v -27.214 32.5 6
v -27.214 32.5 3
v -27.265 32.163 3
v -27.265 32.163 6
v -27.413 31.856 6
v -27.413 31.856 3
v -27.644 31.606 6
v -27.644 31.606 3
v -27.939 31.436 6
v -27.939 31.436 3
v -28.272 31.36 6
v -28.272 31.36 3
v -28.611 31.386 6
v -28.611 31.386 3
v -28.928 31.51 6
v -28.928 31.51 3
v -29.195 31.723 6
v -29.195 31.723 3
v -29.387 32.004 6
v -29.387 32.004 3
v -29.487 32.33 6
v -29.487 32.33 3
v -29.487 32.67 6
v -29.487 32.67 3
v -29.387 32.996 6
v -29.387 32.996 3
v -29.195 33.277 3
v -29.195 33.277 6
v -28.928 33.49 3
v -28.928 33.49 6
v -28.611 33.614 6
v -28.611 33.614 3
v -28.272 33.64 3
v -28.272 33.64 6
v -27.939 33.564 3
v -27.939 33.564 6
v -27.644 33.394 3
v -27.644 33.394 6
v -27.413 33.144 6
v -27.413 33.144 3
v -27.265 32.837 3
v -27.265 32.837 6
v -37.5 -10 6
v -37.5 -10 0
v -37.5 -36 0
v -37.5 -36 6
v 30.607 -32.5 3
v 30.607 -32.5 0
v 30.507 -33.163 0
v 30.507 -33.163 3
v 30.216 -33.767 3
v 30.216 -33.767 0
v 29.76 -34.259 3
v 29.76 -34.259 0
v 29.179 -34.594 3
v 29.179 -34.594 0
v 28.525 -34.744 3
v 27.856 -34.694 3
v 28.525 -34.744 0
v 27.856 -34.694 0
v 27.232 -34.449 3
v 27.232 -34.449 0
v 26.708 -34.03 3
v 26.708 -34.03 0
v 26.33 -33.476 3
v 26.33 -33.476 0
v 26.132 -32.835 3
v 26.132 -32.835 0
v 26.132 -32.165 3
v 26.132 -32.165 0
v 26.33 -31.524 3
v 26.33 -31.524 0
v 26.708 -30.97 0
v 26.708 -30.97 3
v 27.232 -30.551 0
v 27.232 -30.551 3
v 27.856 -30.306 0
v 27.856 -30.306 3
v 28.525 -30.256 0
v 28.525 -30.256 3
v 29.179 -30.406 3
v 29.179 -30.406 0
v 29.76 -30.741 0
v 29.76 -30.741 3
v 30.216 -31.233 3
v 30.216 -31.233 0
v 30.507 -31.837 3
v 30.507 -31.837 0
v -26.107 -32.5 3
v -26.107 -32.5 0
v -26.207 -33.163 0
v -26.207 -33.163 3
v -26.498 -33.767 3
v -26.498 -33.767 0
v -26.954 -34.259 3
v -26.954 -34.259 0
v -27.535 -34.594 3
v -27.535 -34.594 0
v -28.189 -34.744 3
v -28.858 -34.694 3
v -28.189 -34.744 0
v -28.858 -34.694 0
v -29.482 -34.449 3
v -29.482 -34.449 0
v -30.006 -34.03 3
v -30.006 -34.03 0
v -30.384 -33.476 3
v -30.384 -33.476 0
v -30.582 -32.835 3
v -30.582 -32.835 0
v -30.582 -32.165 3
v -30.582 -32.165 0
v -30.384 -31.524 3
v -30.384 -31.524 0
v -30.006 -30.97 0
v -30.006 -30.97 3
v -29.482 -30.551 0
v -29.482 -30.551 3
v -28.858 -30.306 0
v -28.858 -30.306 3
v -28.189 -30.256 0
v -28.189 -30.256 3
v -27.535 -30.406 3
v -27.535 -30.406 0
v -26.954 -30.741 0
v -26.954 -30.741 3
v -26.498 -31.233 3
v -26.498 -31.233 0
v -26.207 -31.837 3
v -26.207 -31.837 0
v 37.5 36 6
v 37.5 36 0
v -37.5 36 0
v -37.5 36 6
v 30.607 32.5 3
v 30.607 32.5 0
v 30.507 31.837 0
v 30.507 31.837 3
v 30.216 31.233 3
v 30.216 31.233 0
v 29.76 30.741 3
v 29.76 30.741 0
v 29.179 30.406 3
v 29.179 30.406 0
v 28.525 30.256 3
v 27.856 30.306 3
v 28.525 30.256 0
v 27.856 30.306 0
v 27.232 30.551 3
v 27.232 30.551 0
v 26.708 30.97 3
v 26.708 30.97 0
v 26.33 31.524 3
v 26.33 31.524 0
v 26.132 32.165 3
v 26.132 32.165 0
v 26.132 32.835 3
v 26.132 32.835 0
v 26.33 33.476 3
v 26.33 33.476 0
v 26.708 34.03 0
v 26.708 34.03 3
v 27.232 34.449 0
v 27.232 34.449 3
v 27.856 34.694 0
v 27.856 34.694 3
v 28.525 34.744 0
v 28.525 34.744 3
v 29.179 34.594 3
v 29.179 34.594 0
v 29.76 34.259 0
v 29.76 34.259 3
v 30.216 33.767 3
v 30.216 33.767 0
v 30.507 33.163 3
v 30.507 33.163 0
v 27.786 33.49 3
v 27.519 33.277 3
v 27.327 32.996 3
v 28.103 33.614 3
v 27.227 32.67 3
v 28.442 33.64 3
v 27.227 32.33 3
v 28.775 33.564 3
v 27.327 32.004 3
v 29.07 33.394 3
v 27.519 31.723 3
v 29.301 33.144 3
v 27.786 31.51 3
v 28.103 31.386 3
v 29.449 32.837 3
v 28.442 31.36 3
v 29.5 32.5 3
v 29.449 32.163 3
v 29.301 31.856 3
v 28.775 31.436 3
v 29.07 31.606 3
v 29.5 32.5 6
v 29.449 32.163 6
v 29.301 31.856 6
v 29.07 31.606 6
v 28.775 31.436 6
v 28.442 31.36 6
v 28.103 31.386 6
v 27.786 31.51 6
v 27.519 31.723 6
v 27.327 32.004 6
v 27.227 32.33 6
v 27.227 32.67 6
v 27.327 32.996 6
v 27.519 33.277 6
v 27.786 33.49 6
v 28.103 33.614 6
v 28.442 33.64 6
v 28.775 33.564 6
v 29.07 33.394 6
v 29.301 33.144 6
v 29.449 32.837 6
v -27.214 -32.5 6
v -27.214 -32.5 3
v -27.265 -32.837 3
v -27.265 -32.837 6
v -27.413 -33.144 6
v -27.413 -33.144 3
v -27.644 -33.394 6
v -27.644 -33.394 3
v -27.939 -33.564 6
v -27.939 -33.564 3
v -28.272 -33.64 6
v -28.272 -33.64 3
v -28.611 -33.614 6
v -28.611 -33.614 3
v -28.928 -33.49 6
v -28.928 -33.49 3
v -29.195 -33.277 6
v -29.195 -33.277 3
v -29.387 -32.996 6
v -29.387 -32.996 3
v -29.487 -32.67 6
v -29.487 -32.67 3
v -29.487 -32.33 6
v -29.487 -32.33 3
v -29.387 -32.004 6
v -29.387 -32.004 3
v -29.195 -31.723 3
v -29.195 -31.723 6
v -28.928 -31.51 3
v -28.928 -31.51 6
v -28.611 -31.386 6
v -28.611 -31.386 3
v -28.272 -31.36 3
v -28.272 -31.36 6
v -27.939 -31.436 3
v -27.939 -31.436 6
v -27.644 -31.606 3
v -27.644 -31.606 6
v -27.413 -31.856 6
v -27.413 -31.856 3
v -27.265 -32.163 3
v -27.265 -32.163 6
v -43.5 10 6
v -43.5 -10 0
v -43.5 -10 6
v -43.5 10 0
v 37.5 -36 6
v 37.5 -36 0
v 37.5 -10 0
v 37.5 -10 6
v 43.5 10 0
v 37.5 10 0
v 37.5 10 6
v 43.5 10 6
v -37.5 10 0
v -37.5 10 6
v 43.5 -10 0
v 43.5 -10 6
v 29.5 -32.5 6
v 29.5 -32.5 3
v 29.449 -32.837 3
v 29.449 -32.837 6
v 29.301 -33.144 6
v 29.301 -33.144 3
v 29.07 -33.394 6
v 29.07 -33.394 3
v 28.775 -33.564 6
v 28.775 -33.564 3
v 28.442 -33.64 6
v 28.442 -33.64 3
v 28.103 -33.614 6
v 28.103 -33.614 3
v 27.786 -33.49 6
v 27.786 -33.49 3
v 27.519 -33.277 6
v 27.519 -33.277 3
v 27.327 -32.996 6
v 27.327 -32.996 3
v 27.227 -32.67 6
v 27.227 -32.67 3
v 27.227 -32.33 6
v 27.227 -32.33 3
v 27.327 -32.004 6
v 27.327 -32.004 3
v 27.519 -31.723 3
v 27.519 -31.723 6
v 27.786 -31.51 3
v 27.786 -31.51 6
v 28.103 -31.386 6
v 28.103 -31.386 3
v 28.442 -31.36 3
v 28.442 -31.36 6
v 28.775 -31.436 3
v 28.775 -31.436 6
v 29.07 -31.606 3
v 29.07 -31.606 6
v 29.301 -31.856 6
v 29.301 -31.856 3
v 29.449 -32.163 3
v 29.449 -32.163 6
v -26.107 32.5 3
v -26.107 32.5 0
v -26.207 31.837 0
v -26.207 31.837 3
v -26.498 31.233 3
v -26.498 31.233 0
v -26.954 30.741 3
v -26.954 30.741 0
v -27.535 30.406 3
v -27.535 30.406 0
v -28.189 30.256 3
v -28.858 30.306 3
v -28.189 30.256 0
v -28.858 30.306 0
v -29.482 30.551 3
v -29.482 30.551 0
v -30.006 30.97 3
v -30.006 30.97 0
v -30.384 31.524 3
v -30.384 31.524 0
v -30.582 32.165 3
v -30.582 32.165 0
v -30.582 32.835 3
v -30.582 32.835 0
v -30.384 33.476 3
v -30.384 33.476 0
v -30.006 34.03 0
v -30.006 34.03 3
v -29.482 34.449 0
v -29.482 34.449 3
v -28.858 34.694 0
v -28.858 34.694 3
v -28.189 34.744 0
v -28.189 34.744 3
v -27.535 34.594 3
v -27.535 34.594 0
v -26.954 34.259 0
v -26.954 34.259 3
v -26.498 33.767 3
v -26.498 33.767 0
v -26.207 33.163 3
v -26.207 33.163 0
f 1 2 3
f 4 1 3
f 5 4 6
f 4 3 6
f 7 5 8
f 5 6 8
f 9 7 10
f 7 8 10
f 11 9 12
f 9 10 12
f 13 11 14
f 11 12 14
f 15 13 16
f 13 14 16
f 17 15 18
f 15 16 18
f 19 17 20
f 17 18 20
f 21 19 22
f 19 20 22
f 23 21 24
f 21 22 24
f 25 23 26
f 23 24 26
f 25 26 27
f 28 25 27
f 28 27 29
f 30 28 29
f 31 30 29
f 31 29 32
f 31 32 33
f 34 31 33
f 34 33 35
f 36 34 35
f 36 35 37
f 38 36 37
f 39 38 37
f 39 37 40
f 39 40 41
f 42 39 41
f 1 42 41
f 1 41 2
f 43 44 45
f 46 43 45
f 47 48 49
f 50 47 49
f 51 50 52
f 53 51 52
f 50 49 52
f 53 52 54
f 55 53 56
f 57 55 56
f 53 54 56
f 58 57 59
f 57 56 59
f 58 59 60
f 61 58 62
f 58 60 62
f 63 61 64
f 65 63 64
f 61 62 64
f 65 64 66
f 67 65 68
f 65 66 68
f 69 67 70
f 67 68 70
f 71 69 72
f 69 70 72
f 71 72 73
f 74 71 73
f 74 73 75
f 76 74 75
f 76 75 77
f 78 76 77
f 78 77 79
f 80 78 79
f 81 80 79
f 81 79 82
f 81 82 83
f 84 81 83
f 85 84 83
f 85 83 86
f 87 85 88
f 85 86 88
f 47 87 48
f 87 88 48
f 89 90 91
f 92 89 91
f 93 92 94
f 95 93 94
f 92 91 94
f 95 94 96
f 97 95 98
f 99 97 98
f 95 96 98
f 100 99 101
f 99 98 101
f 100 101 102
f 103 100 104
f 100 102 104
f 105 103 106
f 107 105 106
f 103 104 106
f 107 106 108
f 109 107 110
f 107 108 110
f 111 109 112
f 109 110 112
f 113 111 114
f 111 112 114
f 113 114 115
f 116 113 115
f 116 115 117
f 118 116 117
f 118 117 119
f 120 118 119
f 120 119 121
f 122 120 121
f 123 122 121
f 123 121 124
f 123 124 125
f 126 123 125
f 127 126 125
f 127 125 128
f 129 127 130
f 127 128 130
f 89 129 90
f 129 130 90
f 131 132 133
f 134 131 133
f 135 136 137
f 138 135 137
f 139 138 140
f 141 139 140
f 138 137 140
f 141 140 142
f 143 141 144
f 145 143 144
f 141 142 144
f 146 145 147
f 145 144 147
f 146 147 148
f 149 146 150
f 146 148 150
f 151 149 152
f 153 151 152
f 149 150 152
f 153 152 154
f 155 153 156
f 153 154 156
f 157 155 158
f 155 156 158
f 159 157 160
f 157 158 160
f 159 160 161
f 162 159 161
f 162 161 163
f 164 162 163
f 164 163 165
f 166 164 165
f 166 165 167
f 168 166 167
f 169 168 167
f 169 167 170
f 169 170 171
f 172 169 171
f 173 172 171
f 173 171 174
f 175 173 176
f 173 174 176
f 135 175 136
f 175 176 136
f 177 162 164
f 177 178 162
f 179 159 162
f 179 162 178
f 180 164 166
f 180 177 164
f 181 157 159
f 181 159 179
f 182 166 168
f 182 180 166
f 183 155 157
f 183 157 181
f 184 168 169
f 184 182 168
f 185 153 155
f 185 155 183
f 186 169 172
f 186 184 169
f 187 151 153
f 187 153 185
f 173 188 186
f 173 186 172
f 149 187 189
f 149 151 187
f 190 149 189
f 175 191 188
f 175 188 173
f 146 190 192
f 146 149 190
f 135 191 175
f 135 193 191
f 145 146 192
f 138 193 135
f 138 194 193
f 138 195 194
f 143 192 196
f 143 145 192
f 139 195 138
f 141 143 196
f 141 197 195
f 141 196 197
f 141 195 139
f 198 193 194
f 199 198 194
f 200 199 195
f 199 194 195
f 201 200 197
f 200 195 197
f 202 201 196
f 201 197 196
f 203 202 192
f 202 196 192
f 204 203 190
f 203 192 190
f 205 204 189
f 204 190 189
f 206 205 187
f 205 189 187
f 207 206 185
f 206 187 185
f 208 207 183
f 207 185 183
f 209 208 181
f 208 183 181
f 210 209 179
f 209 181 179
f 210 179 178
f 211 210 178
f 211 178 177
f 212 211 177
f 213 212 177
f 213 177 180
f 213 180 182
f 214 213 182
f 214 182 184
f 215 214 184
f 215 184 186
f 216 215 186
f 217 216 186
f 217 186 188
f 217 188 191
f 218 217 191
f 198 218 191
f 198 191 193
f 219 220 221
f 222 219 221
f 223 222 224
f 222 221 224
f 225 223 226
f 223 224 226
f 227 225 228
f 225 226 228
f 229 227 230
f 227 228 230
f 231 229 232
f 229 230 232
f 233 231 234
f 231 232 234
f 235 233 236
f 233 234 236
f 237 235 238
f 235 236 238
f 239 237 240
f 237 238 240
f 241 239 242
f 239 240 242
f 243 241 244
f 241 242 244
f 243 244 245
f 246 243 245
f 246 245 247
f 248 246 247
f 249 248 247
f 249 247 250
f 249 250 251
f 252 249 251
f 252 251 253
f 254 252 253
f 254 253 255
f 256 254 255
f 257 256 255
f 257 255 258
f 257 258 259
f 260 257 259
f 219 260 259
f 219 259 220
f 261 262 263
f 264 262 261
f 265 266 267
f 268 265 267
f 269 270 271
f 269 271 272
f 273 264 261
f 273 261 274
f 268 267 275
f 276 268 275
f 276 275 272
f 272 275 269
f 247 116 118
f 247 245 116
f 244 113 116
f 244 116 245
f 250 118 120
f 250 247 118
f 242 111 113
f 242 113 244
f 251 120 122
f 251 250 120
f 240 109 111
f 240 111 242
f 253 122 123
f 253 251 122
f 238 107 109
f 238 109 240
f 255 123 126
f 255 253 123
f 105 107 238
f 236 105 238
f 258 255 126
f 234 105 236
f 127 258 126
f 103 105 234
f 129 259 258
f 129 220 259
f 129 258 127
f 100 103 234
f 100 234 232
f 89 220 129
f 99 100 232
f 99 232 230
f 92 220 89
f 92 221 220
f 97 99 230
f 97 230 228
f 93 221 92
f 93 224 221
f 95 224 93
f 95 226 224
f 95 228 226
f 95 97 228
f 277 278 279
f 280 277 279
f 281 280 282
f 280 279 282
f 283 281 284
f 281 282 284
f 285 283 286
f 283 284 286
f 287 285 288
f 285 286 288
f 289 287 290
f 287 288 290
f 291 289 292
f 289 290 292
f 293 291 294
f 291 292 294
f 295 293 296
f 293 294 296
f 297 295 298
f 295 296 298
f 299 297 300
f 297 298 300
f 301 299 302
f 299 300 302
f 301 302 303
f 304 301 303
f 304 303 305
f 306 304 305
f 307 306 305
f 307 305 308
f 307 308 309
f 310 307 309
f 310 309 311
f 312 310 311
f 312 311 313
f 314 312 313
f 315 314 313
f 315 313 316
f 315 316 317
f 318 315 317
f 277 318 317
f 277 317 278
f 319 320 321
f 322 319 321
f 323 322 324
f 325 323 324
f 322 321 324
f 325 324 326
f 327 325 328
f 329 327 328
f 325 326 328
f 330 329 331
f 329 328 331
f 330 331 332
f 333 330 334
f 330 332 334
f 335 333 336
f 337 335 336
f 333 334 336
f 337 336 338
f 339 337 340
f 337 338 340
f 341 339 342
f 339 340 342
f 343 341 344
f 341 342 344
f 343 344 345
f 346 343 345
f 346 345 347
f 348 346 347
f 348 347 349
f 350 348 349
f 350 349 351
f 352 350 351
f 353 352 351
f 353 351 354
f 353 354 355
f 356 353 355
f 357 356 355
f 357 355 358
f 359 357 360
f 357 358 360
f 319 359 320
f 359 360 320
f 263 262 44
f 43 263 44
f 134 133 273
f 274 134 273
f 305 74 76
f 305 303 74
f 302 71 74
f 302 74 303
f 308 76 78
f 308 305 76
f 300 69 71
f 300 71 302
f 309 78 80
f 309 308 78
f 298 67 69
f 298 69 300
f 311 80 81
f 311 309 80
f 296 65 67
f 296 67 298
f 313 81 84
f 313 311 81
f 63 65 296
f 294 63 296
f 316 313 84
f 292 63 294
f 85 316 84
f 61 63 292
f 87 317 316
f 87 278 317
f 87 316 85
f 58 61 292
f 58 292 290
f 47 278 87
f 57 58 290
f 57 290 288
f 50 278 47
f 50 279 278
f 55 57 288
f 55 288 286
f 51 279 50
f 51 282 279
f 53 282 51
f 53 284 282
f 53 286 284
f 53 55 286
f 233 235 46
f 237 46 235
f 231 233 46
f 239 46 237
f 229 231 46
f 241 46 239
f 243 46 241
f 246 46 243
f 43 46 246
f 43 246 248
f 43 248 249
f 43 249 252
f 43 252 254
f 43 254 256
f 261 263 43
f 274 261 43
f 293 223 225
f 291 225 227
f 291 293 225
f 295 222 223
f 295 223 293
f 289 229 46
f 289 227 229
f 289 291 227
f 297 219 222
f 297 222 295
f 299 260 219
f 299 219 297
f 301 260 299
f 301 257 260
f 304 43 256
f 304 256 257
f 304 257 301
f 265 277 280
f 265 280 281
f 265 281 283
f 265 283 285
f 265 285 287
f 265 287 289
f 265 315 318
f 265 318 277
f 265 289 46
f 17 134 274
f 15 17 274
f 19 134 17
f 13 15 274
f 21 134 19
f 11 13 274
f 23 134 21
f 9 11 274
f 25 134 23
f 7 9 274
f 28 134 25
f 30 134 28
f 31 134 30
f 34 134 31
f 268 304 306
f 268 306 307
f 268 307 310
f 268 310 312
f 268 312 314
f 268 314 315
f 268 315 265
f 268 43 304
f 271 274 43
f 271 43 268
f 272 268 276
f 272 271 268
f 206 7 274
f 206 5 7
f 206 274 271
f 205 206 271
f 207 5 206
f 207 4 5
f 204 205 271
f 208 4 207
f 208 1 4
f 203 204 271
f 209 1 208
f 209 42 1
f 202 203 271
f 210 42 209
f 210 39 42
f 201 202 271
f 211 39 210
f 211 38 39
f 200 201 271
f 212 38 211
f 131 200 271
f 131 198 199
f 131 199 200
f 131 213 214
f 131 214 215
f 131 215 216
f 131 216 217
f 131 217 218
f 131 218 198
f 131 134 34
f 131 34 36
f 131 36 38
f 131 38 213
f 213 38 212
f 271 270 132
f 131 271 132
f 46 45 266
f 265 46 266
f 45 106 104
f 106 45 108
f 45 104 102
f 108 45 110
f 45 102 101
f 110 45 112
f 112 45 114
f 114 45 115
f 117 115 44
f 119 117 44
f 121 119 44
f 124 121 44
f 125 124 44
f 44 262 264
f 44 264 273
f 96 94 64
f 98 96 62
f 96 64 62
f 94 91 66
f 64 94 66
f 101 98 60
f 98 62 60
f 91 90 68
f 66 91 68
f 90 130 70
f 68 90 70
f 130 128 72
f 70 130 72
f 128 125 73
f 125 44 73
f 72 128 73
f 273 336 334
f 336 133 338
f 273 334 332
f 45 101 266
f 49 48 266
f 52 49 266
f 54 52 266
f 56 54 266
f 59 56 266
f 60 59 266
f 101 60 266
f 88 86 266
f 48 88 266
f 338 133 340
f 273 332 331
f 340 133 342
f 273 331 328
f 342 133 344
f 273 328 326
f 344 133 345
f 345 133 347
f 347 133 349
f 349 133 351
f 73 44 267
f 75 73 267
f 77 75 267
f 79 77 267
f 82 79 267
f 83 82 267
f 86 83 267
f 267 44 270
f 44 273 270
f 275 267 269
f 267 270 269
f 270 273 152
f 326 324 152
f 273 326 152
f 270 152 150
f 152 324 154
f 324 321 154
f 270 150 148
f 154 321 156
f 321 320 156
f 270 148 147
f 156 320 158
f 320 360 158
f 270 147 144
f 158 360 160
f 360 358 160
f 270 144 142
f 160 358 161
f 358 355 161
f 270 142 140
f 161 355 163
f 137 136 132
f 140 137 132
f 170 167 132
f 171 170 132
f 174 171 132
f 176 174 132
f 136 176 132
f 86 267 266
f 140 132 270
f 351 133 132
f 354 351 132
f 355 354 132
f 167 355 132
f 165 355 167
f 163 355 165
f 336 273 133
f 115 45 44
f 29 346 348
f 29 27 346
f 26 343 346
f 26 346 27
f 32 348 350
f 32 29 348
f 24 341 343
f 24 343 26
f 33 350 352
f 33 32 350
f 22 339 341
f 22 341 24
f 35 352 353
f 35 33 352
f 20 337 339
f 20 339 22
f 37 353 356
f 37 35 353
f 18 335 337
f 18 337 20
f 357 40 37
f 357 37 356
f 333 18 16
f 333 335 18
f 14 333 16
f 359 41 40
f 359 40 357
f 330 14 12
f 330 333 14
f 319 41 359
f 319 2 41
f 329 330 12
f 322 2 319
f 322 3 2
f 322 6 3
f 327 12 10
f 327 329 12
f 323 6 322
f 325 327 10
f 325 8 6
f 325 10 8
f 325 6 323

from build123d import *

# Parameters (mm, degrees)
F0_W     = 6
F0_H     = 20
F1_DEPTH = 6
F2_R     = 2.25
F2_R_2   = 1.143
F3_DEPTH = 3
F4_DEPTH = 6


# Not quite as in the source:
# - a feature names something its author has since deleted; it is built from what else it names


with BuildPart() as f1:
    # F0 (on Top) → F1 (new body)
    with BuildSketch(Plane.XY):
        Polygon((-37.5, -36), (37.5, -36), (37.5, -10), (37.5, 10), (37.5, 36), (-37.5, 36), (-37.5, 10), (-37.5, -10), align=None)
        with Locations((40.5, 0)):
            Rectangle(F0_W, F0_H)
        with Locations((-40.5, 0)):
            Rectangle(F0_W, F0_H)
    extrude(amount=F1_DEPTH)

    # F2 (on face) → F3 (cut)
    with BuildSketch(Plane(origin=(0, 0, 0), x_dir=(1, 0, 0), z_dir=(0, 0, -1))):
        with Locations((-28.357, -32.5)):
            Circle(F2_R)
        with Locations((-28.357, -32.5)):
            Circle(F2_R_2, mode=Mode.SUBTRACT)
        with Locations((28.357, -32.5)):
            Circle(F2_R)
        with Locations((28.357, -32.5)):
            Circle(F2_R_2, mode=Mode.SUBTRACT)
        with Locations((-28.357, 32.5)):
            Circle(F2_R)
        with Locations((-28.357, 32.5)):
            Circle(F2_R_2, mode=Mode.SUBTRACT)
        with Locations((28.357, 32.5)):
            Circle(F2_R)
        with Locations((28.357, 32.5)):
            Circle(F2_R_2, mode=Mode.SUBTRACT)
    extrude(amount=-F3_DEPTH, mode=Mode.SUBTRACT)

    # F2 (on face) → F4 (cut, through all)
    with BuildSketch(Plane(origin=(0, 0, 0), x_dir=(1, 0, 0), z_dir=(0, 0, -1))):
        with Locations((-28.357, -32.5)):
            Circle(F2_R_2)
        with Locations((28.357, -32.5)):
            Circle(F2_R_2)
        with Locations((28.357, 32.5)):
            Circle(F2_R_2)
        with Locations((-28.357, 32.5)):
            Circle(F2_R_2)
    extrude(amount=-F4_DEPTH, mode=Mode.SUBTRACT)


solid = f1.part
